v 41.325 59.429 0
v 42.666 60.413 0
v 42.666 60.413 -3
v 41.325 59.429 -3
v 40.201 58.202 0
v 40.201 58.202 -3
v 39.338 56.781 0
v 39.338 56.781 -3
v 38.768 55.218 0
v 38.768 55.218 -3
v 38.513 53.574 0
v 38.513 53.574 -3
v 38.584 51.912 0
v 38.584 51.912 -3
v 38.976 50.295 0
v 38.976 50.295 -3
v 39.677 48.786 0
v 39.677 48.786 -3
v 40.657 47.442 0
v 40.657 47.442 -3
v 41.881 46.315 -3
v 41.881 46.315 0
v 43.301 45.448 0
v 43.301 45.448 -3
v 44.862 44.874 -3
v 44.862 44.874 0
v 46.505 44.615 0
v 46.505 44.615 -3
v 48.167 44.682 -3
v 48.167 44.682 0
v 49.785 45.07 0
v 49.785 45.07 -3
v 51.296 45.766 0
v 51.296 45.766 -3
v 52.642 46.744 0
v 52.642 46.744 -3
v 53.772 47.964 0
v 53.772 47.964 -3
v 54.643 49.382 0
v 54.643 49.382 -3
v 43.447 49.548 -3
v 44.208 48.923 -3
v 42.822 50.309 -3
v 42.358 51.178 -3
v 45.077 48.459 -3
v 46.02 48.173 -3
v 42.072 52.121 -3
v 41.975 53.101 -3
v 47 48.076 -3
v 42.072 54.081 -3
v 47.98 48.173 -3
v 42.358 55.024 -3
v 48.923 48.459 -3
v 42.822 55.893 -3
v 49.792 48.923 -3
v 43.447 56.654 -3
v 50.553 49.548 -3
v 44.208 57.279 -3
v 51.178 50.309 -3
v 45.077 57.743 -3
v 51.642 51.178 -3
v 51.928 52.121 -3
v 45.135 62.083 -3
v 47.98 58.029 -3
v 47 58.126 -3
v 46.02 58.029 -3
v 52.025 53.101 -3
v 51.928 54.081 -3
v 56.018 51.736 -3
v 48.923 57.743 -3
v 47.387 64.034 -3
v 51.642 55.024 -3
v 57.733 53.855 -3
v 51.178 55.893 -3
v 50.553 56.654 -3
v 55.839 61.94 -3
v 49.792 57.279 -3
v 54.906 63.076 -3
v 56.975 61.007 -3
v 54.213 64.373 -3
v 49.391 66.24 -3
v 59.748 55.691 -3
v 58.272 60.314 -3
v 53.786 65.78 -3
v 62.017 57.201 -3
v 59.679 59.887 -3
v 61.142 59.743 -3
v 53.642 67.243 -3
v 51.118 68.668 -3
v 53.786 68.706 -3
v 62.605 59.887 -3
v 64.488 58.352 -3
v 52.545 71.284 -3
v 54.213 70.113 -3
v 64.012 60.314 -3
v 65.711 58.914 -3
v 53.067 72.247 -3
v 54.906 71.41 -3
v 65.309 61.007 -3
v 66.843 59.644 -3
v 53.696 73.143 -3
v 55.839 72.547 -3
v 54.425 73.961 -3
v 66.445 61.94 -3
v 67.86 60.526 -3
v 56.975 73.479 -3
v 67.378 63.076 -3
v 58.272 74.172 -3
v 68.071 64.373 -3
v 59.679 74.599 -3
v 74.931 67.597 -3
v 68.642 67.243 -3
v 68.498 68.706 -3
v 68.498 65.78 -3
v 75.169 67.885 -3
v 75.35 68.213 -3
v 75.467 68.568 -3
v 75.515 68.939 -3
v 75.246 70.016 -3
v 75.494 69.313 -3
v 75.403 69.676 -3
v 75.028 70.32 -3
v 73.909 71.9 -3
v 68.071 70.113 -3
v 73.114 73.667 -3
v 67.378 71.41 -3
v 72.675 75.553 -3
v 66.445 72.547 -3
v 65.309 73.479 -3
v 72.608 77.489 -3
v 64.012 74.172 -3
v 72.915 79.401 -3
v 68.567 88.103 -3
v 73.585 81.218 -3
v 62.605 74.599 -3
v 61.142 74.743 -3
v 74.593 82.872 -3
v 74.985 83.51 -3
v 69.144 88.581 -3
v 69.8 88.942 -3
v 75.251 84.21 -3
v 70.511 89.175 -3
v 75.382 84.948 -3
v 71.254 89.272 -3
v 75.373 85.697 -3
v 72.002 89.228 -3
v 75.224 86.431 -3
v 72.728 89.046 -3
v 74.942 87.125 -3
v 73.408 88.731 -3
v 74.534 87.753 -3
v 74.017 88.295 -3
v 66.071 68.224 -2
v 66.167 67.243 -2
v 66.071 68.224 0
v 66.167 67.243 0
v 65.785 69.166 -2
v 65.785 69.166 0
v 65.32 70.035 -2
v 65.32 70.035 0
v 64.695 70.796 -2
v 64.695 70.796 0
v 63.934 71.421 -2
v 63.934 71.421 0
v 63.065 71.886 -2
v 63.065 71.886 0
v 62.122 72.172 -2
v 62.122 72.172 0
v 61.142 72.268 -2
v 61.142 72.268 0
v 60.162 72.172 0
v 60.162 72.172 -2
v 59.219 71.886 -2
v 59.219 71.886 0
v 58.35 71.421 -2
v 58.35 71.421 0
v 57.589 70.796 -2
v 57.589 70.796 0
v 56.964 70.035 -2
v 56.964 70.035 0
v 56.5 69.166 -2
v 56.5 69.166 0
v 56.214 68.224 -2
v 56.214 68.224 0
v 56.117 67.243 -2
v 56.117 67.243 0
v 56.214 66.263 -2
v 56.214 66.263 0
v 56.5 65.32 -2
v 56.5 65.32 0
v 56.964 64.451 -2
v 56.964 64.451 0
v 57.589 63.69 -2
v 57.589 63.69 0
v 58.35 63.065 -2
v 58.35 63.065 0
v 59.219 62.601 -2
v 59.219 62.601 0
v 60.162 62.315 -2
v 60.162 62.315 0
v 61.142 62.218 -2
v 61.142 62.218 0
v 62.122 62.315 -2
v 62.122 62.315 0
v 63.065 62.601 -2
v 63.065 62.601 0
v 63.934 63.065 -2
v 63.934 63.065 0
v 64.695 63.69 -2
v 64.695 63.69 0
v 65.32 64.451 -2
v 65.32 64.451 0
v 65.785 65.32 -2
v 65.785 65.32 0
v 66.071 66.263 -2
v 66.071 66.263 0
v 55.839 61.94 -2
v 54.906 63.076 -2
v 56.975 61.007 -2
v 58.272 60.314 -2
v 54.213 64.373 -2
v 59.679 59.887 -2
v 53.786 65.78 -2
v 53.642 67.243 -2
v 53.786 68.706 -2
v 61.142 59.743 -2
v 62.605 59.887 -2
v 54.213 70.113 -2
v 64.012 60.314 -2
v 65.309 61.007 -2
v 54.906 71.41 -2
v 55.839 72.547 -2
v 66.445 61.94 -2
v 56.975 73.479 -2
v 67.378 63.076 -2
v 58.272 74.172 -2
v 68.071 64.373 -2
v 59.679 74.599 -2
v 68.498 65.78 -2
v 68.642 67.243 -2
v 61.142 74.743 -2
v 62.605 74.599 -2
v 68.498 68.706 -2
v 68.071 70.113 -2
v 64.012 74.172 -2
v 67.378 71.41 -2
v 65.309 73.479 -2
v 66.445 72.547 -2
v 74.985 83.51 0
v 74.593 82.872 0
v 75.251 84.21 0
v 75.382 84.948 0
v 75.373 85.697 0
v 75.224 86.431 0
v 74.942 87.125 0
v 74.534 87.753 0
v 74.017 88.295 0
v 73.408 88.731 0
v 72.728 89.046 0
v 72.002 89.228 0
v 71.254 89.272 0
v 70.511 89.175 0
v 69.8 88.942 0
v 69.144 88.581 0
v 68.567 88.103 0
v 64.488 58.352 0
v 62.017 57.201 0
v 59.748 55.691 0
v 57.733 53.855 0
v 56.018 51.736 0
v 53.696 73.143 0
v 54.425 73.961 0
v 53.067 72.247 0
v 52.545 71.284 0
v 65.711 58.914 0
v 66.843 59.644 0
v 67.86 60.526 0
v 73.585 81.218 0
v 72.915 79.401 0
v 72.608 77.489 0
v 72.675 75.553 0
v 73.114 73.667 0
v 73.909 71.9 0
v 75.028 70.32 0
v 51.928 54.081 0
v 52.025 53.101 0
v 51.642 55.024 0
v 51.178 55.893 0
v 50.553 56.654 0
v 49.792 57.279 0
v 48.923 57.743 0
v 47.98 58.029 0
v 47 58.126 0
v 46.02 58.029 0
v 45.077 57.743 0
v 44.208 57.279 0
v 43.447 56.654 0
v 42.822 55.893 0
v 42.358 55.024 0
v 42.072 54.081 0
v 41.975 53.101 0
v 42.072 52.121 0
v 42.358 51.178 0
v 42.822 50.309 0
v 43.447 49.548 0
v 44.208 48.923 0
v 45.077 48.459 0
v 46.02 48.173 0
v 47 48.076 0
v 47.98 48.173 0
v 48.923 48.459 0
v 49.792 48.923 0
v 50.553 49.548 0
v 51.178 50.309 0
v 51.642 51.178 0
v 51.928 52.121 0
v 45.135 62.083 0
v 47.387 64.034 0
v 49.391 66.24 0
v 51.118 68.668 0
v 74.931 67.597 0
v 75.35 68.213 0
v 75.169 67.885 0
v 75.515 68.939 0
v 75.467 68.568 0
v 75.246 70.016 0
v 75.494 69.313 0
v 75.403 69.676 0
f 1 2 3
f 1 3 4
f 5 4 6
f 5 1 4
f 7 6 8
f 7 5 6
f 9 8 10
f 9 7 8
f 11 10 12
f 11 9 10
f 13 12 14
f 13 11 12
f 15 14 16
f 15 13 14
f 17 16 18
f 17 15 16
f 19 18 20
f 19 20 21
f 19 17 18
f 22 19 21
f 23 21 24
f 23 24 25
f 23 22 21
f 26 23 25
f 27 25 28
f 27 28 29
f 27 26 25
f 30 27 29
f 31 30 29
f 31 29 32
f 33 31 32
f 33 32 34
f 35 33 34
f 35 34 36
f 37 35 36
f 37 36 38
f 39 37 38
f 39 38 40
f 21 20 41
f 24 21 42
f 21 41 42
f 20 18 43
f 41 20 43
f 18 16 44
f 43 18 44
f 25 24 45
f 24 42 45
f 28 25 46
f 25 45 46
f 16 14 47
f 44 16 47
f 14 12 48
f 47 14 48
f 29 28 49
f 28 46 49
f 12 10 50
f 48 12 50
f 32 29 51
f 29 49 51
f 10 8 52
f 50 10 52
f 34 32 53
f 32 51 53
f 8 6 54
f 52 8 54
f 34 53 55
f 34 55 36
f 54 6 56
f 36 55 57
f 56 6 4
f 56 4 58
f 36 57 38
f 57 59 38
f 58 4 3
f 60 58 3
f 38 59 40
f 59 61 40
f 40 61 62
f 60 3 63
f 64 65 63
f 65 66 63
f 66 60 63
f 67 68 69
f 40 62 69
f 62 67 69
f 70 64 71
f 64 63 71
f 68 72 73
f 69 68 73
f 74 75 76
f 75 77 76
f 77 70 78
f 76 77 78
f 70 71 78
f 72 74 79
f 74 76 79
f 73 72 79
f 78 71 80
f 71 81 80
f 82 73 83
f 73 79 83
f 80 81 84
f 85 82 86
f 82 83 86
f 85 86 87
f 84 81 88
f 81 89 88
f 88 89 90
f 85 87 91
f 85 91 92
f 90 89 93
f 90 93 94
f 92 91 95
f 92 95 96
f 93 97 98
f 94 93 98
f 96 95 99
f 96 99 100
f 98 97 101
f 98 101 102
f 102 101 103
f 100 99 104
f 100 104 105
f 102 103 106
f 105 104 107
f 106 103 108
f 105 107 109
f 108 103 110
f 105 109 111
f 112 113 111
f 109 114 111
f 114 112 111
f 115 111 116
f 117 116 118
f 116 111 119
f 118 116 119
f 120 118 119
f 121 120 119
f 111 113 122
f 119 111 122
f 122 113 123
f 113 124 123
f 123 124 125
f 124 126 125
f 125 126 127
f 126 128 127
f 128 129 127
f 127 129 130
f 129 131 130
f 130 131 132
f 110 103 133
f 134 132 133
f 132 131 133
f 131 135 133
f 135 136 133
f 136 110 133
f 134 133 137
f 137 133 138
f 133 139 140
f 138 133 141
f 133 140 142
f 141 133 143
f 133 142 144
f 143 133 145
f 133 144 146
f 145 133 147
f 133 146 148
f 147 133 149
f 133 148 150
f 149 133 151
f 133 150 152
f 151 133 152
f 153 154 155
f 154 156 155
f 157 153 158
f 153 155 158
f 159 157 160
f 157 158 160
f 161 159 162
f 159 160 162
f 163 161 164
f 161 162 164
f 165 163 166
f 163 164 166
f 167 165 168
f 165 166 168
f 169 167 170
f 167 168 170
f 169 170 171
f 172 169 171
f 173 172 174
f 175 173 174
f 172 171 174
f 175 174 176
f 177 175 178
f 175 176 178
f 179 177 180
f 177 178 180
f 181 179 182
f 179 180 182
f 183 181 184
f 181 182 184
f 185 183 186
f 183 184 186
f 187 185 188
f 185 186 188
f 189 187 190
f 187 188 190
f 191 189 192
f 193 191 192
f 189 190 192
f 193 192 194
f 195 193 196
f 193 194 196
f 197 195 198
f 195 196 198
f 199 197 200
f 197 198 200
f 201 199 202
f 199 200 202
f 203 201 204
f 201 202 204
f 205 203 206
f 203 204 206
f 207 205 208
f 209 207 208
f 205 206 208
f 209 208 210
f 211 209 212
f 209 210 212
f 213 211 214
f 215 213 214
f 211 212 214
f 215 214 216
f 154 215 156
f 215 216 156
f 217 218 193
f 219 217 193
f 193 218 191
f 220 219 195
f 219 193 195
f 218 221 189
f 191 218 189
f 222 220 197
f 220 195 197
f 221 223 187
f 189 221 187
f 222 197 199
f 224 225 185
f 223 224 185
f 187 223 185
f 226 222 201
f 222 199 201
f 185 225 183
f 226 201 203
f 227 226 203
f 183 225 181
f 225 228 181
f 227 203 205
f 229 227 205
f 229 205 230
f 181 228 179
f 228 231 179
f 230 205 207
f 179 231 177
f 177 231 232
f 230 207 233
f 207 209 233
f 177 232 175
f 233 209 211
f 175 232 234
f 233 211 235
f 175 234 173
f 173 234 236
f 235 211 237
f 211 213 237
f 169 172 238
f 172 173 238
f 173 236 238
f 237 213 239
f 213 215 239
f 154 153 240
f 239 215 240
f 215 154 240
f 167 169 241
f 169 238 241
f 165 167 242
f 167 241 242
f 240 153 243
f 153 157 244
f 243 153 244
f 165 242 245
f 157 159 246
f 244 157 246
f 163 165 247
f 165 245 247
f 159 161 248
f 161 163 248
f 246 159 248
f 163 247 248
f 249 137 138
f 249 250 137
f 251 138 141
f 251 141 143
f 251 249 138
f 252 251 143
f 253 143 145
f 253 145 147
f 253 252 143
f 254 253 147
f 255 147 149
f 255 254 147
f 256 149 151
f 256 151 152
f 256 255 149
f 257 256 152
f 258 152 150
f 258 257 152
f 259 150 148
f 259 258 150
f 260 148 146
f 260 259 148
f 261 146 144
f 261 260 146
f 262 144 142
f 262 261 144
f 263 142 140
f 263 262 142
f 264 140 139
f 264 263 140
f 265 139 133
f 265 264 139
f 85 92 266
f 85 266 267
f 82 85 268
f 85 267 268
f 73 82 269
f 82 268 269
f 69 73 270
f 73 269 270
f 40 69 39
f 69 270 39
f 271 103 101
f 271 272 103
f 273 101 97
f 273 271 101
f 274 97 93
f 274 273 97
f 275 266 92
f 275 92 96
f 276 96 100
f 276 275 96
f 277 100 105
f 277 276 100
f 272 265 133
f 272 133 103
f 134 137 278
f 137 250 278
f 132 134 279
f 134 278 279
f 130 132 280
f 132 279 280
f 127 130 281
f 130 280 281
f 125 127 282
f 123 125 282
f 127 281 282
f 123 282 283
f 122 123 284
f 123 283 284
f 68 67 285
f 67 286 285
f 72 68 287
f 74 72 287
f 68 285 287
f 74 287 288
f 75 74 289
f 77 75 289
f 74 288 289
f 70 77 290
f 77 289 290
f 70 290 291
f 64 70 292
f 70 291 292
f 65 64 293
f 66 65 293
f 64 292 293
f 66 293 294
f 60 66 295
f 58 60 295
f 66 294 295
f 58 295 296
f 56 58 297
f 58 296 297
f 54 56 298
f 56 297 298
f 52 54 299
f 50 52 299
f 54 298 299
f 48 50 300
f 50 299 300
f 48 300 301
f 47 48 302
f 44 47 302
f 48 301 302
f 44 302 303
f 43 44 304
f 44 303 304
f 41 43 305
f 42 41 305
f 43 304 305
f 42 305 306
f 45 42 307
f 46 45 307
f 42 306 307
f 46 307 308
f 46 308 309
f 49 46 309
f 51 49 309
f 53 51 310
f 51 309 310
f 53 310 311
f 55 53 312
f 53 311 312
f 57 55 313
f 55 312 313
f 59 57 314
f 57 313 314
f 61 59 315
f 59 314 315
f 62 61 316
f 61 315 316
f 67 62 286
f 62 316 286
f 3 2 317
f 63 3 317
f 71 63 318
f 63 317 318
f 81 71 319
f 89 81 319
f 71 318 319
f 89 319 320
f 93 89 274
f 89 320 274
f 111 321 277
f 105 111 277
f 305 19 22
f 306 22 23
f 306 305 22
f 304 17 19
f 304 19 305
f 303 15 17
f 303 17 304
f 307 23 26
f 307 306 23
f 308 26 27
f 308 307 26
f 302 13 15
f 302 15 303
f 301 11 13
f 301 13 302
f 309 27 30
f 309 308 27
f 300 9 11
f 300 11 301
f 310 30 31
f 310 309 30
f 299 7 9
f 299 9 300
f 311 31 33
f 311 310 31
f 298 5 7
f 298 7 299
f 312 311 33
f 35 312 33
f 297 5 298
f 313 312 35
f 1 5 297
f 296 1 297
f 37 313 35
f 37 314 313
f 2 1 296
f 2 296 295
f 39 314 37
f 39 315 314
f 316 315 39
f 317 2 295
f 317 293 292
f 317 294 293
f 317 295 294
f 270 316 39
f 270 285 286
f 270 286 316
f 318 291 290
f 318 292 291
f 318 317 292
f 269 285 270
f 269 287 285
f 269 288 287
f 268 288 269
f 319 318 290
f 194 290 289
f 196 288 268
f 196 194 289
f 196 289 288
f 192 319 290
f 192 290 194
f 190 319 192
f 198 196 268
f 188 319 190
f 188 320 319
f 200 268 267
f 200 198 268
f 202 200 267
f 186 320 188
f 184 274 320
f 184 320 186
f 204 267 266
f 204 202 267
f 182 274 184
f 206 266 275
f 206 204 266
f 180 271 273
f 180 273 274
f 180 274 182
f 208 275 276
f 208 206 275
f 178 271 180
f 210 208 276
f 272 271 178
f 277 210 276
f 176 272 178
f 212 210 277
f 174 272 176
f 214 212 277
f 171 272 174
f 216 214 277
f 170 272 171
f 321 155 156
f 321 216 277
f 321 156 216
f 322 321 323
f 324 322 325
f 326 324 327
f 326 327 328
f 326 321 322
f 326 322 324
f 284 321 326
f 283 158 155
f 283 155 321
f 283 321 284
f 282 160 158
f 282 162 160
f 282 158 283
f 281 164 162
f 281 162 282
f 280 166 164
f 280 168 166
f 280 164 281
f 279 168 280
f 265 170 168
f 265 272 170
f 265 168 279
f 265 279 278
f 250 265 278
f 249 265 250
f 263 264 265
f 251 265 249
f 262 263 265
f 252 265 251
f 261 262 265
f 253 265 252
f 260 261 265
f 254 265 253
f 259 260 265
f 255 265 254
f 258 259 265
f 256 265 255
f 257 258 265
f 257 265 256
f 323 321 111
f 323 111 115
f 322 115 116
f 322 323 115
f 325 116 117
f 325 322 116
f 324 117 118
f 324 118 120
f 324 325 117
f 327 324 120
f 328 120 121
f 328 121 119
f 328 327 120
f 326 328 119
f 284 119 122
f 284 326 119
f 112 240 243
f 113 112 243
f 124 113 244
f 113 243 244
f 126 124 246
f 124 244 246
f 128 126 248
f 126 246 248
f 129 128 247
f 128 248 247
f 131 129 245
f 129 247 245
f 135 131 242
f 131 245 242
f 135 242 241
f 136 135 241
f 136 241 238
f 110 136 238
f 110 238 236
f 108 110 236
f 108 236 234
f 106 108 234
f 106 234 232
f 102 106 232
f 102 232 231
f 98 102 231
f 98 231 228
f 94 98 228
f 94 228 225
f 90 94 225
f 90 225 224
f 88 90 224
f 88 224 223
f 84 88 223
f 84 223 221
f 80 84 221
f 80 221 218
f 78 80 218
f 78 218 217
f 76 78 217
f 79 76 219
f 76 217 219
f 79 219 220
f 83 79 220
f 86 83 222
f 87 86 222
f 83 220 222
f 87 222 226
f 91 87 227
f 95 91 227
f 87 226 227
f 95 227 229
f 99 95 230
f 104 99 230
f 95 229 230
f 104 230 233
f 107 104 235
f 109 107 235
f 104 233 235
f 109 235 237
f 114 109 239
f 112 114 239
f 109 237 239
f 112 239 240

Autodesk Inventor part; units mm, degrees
ref_plane "YZ Plane" through (0, 0, 0) normal (1, 0, 0) x (0, 1, 0)
ref_plane "XZ Plane" through (0, 0, 0) normal (0, 1, 0) x (-1, 0, 0)
ref_plane "XY Plane" through (0, 0, 0) normal (0, 0, 1) x (1, 0, 0)
sketch "Sketch1" plane through (0, 0, 0) normal (0, 0, 1) x (1, 0, 0)
  circle A0 centre (47, 53.101) radius 5.025
  line L0 (47, 53.101) -> (61.1421, 67.2432) construction
  circle A1 centre (61.1421, 67.2432) radius 5.025
  circle A2 centre (61.1421, 67.2432) radius 9.5
  circle A3 centre (47, 53.101) radius 8.5
  line L1 (68.5668, 88.1028) -> (54.4246, 73.9607)
  arc A4 (74.5933, 82.8719) -> (68.5668, 88.1028) centre (71.3952, 85.2744) ccw
  arc A5 (74.5933, 82.8719) -> (75.0285, 70.3201) centre (82.5886, 76.8657) ccw
  arc A6 (74.9307, 67.5967) -> (75.0285, 70.3201) centre (73.5165, 69.0109) ccw
  line L2 (74.9307, 67.5967) -> (67.8597, 60.5257)
  circle A7 centre (47, 53.101) radius 7.5
  circle A8 centre (61.1421, 67.2432) radius 7.5
  arc A9 (42.6661, 60.4132) -> (52.5446, 71.2845) centre (29.9195, 81.9195) ccw
  arc A10 (64.4883, 58.352) -> (54.6431, 49.3817) centre (70.8284, 41.5055) ccw
  line L3 (124.9643, 38.1784) -> (101.7414, 38.1784) construction
  point P0 (0, 0)
  dimension "d33" = 10.05
  dimension "d34" = 20
  dimension "d35" = 10.05
  dimension "d36" = 19
  dimension "d37" = 17
  dimension "d38" = 4
  dimension "d39" = 2
  dimension "d40" = 10
  dimension "d41" = 20
  dimension "d42" = 10
  dimension "d43" = 15
  dimension "d44" = 15
  dimension "d45" = 25
  dimension "d46" = 18
  dimension "d47" = 45
extrude "Extrusion1" add sketch "Sketch1" against normal blind 3 contours A2 | A2 L1 A4 A5 A6 L2 | A2 A10 A3 A9 | A3 | A7
extrude "Extrusion2" add sketch "Sketch1" against normal blind 2 contours A8
properties part number "dsa" material "Aluminum 7075"
